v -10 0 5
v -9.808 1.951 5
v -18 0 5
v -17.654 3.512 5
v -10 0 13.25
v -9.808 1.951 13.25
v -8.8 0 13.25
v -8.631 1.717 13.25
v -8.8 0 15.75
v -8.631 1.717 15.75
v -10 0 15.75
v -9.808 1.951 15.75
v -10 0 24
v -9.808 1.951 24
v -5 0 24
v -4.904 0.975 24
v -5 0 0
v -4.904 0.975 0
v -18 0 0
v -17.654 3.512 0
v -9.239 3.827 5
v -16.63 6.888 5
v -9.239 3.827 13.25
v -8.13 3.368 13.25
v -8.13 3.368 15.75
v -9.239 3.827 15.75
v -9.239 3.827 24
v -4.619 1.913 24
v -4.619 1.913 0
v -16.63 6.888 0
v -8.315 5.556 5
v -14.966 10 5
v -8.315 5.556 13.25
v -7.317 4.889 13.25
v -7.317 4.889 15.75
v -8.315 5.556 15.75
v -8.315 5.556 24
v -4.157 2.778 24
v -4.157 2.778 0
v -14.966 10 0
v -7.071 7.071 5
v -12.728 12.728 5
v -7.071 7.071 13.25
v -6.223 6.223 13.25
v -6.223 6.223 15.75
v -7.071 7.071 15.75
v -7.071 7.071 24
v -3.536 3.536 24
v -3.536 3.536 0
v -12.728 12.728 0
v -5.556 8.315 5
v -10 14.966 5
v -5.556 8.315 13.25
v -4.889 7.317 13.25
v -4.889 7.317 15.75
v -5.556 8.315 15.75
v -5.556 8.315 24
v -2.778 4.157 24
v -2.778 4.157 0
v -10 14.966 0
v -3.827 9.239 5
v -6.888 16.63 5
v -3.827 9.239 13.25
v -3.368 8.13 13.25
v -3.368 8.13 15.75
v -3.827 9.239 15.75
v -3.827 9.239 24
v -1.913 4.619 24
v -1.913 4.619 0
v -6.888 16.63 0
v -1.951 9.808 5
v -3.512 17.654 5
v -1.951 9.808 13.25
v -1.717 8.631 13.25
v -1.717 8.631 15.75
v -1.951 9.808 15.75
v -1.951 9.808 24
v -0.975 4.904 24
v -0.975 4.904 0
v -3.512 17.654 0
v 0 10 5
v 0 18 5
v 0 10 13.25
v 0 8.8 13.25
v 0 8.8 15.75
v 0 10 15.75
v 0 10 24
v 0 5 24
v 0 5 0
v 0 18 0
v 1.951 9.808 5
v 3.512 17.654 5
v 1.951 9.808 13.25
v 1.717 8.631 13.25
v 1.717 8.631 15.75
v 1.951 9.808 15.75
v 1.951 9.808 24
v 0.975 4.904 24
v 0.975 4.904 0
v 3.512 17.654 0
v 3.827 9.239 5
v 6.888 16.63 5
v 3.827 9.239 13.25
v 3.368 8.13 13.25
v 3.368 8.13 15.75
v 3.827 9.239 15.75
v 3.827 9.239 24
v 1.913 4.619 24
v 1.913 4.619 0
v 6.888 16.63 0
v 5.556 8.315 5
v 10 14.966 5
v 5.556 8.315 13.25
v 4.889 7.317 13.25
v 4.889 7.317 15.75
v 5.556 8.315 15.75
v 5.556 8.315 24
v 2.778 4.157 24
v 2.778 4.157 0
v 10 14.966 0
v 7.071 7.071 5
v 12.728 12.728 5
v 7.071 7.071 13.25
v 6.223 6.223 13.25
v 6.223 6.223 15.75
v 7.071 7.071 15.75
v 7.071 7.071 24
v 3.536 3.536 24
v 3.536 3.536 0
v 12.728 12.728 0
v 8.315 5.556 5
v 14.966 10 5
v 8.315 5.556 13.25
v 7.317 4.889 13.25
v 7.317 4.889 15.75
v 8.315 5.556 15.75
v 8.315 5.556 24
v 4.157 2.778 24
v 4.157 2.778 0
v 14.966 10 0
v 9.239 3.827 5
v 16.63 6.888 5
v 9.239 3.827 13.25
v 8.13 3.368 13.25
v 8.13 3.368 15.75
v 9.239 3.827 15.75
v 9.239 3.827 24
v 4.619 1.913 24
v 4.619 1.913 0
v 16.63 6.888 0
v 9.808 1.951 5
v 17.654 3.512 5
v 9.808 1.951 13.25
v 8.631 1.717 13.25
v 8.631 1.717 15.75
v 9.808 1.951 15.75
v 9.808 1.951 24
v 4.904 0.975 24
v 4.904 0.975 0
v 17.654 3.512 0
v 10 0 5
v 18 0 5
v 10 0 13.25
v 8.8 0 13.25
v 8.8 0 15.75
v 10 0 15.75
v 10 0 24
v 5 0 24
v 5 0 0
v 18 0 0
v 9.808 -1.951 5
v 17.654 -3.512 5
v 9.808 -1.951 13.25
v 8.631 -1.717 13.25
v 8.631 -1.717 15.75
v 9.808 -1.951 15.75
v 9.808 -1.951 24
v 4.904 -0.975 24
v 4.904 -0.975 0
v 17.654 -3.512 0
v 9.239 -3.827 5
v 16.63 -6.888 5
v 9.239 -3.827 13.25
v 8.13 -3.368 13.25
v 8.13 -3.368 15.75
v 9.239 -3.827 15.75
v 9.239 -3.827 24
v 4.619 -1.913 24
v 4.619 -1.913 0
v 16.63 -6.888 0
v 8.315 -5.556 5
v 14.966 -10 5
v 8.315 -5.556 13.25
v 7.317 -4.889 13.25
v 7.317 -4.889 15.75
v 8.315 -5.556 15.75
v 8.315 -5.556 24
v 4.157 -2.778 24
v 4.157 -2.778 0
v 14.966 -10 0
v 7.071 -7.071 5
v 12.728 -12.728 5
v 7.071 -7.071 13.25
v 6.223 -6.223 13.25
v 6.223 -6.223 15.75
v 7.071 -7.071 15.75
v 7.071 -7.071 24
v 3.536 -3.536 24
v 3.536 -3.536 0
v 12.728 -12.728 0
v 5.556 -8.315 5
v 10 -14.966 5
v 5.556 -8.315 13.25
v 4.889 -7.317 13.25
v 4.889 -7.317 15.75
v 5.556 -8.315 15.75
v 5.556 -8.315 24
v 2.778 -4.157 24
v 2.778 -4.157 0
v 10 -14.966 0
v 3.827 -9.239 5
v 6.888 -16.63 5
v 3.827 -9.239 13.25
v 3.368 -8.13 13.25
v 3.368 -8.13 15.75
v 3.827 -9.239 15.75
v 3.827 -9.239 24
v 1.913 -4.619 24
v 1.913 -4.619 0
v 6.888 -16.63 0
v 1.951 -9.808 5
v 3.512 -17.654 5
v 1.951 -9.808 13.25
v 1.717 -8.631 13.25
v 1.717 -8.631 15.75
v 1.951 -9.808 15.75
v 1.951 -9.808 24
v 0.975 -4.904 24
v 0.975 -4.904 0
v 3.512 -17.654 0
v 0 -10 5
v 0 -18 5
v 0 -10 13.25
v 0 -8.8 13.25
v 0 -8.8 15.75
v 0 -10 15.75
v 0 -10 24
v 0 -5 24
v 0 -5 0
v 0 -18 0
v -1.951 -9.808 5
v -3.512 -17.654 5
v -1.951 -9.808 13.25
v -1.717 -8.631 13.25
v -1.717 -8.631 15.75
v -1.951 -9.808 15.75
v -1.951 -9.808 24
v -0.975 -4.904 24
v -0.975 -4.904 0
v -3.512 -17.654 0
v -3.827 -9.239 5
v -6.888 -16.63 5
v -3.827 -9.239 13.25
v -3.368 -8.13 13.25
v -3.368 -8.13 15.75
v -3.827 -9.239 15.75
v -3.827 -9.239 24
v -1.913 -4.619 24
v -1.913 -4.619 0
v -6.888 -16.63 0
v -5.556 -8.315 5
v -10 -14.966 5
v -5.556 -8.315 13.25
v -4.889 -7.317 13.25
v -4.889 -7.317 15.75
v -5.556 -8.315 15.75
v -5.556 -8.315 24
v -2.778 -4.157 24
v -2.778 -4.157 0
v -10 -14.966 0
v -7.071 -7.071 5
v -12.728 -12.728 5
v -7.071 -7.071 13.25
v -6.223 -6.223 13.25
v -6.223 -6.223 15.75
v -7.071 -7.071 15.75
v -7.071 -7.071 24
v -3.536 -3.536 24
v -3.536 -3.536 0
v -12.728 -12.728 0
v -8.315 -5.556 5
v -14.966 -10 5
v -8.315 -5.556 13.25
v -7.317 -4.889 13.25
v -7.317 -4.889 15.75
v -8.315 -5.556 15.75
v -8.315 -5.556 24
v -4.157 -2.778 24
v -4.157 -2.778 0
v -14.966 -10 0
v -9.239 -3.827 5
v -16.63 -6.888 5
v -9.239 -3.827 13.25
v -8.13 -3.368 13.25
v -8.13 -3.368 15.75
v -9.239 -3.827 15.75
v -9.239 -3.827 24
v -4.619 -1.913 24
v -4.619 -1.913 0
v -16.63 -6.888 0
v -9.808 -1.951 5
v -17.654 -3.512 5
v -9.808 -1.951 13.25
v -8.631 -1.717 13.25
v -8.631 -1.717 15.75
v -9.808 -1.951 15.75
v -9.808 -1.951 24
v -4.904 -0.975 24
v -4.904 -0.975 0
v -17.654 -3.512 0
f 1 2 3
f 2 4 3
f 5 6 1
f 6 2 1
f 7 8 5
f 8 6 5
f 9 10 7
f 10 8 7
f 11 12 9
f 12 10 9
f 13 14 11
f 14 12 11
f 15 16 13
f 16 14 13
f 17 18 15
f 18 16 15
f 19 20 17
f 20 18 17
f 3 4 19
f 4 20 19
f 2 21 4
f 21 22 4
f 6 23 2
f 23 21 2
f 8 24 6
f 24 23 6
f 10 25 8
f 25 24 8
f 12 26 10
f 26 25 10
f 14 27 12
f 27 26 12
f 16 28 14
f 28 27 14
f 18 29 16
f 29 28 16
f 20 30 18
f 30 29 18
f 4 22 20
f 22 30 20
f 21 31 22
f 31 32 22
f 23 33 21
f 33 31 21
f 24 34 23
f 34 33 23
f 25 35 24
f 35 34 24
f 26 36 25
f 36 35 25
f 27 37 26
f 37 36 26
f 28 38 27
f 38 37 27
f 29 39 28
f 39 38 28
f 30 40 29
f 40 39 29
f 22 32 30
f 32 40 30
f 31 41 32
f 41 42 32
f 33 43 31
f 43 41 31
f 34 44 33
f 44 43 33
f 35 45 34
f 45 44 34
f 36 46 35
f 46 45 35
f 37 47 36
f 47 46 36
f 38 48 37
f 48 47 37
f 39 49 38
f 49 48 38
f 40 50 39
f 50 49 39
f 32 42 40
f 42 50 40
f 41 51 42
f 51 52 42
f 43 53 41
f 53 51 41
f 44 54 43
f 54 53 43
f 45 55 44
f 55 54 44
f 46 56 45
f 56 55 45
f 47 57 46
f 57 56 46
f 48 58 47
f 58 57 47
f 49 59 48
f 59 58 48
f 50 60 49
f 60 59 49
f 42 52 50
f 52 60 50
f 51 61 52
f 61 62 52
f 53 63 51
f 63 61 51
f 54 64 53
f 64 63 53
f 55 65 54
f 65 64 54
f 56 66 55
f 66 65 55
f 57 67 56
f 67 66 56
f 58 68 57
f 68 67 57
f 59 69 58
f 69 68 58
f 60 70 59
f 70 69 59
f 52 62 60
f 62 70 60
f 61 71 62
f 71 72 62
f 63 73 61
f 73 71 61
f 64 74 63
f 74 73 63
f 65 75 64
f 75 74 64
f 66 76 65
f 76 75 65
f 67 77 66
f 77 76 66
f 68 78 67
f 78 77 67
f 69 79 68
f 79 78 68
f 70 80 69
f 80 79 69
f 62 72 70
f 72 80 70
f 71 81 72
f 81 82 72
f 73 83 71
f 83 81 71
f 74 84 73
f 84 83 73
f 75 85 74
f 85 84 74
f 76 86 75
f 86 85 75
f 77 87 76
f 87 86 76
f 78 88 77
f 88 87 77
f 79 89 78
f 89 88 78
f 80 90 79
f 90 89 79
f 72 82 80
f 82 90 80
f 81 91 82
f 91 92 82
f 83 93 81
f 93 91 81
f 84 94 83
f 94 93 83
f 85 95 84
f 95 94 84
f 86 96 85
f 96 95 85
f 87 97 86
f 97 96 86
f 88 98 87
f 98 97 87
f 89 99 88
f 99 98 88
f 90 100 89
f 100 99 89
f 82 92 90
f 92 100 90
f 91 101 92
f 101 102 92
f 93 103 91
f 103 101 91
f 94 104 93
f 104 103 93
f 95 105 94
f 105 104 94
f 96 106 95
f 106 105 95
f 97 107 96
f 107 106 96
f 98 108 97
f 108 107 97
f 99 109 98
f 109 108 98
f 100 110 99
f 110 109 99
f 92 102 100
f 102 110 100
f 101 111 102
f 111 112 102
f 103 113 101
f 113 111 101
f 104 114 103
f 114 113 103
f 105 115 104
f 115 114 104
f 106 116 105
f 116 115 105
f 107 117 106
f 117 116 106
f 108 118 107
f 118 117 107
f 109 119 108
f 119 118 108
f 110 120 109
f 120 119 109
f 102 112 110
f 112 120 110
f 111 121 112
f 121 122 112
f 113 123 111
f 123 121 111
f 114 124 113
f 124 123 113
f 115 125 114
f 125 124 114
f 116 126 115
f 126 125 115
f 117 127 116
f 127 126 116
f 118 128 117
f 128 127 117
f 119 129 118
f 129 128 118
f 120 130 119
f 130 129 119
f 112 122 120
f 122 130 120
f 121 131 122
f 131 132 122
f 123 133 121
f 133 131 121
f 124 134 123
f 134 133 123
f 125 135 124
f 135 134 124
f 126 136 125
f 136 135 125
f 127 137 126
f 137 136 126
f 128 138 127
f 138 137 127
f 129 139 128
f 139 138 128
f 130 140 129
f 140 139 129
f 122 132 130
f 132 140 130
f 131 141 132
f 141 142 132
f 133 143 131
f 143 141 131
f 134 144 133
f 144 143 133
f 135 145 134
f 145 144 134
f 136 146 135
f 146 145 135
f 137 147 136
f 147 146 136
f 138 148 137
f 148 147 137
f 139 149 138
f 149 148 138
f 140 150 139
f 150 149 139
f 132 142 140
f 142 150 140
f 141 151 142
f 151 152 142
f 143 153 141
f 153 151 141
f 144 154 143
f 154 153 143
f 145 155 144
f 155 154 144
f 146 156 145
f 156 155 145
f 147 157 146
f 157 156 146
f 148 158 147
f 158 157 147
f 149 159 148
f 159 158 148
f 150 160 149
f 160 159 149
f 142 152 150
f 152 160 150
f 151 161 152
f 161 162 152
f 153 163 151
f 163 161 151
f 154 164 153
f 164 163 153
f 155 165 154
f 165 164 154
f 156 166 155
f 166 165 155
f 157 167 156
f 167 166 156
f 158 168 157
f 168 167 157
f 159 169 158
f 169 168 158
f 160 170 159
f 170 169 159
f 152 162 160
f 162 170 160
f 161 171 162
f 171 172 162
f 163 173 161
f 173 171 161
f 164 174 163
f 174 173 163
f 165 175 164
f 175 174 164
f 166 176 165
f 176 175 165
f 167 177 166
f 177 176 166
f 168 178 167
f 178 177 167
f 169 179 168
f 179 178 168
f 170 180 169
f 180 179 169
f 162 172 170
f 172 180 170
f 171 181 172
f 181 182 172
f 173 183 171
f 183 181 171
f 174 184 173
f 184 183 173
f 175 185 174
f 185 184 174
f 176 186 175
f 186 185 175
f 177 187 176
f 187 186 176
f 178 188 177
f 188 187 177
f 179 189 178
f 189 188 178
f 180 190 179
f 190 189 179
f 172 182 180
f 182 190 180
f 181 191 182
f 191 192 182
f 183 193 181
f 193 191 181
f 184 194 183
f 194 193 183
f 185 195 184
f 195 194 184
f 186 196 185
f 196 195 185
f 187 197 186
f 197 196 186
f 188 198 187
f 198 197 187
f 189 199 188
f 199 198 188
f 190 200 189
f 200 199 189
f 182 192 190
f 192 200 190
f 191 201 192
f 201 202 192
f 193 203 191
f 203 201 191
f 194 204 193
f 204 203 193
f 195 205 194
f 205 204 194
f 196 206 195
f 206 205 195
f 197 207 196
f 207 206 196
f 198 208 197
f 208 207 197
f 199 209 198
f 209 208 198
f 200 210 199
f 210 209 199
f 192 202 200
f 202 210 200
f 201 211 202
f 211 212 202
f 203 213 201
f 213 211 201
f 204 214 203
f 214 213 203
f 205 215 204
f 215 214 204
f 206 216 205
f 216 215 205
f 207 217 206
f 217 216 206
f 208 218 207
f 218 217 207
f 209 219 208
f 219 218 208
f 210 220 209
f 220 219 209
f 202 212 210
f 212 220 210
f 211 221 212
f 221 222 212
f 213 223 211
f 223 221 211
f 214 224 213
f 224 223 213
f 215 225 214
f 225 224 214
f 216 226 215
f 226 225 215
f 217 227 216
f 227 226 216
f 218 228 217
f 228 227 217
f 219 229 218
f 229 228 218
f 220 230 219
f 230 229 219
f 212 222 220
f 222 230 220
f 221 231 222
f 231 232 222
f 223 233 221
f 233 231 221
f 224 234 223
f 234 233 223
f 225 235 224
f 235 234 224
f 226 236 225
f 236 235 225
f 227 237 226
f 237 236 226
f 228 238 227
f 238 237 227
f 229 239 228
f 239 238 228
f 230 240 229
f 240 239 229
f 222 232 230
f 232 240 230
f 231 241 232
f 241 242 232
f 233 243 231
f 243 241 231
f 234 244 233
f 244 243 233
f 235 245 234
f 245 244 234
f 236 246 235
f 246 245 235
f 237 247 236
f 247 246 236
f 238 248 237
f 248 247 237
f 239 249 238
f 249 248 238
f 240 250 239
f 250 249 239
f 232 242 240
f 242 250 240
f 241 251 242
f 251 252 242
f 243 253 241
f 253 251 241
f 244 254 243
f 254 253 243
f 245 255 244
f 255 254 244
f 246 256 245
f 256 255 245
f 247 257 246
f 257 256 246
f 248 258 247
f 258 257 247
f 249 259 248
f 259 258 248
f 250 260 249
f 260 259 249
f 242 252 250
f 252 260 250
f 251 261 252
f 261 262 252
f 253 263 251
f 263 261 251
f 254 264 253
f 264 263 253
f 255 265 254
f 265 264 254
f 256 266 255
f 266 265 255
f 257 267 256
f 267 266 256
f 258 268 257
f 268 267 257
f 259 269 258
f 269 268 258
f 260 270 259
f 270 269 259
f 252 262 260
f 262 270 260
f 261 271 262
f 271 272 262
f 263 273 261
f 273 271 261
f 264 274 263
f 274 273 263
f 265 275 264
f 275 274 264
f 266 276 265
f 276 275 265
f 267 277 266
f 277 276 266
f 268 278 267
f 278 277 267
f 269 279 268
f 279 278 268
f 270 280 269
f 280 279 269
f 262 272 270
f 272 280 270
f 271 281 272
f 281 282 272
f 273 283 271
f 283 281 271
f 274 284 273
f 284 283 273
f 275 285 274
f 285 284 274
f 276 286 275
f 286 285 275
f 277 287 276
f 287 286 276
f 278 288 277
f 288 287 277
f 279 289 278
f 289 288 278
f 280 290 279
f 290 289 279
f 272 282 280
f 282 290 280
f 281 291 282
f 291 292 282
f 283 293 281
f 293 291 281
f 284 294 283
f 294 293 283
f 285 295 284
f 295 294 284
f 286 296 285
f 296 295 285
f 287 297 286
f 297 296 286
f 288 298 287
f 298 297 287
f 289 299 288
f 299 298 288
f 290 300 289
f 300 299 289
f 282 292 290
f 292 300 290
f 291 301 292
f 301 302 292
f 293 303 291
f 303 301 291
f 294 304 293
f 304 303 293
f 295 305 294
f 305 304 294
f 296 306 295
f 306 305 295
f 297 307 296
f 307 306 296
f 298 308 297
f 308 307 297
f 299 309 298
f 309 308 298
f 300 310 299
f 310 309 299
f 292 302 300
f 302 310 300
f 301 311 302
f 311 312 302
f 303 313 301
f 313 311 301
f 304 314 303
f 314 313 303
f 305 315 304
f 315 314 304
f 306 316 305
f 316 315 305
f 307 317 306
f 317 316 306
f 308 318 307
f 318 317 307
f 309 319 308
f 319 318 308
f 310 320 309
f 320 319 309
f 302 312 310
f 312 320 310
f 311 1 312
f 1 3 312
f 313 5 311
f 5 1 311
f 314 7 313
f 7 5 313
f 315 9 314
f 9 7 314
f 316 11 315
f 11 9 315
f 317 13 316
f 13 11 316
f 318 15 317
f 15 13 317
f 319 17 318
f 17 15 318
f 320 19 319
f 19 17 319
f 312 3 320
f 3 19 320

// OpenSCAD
$fn = 32;

// ----------------------------------------------------------------------
// Grooved revolve: flanged, bore R5
// ----------------------------------------------------------------------

// --- parameters (mm) ---
bore_r = 5;               // bore radius
outer_r = 10;             // outer radius of the body
total_h = 24;             // overall height, Z
wall = 5;                 // radial wall thickness
groove_w = 2.5;           // groove width
groove_d = 1.2;           // groove depth
grooves = 1;              // number of outer grooves
flange_r = 18;            // flange radius
flange_h = 5;             // flange height

bbox_x = 2 * flange_r;  // full diameter
bore_d = 2 * bore_r;  // bore diameter
body_d = 2 * outer_r;  // body diameter
flange_d = 2 * flange_r;  // flange diameter
revolve_angle = 360;  // full turn around the Z axis

profile = [[5, 0], [10, 0], [18, 0], [18, 5], [10, 5], [10, 13.25], [8.8, 13.25], [8.8, 15.75], [10, 15.75], [10, 24], [5, 24]];  // primary outline, 11 points, counter clockwise

// --- the one profile operation ---
rotate_extrude(angle = revolve_angle) polygon(points = profile);
